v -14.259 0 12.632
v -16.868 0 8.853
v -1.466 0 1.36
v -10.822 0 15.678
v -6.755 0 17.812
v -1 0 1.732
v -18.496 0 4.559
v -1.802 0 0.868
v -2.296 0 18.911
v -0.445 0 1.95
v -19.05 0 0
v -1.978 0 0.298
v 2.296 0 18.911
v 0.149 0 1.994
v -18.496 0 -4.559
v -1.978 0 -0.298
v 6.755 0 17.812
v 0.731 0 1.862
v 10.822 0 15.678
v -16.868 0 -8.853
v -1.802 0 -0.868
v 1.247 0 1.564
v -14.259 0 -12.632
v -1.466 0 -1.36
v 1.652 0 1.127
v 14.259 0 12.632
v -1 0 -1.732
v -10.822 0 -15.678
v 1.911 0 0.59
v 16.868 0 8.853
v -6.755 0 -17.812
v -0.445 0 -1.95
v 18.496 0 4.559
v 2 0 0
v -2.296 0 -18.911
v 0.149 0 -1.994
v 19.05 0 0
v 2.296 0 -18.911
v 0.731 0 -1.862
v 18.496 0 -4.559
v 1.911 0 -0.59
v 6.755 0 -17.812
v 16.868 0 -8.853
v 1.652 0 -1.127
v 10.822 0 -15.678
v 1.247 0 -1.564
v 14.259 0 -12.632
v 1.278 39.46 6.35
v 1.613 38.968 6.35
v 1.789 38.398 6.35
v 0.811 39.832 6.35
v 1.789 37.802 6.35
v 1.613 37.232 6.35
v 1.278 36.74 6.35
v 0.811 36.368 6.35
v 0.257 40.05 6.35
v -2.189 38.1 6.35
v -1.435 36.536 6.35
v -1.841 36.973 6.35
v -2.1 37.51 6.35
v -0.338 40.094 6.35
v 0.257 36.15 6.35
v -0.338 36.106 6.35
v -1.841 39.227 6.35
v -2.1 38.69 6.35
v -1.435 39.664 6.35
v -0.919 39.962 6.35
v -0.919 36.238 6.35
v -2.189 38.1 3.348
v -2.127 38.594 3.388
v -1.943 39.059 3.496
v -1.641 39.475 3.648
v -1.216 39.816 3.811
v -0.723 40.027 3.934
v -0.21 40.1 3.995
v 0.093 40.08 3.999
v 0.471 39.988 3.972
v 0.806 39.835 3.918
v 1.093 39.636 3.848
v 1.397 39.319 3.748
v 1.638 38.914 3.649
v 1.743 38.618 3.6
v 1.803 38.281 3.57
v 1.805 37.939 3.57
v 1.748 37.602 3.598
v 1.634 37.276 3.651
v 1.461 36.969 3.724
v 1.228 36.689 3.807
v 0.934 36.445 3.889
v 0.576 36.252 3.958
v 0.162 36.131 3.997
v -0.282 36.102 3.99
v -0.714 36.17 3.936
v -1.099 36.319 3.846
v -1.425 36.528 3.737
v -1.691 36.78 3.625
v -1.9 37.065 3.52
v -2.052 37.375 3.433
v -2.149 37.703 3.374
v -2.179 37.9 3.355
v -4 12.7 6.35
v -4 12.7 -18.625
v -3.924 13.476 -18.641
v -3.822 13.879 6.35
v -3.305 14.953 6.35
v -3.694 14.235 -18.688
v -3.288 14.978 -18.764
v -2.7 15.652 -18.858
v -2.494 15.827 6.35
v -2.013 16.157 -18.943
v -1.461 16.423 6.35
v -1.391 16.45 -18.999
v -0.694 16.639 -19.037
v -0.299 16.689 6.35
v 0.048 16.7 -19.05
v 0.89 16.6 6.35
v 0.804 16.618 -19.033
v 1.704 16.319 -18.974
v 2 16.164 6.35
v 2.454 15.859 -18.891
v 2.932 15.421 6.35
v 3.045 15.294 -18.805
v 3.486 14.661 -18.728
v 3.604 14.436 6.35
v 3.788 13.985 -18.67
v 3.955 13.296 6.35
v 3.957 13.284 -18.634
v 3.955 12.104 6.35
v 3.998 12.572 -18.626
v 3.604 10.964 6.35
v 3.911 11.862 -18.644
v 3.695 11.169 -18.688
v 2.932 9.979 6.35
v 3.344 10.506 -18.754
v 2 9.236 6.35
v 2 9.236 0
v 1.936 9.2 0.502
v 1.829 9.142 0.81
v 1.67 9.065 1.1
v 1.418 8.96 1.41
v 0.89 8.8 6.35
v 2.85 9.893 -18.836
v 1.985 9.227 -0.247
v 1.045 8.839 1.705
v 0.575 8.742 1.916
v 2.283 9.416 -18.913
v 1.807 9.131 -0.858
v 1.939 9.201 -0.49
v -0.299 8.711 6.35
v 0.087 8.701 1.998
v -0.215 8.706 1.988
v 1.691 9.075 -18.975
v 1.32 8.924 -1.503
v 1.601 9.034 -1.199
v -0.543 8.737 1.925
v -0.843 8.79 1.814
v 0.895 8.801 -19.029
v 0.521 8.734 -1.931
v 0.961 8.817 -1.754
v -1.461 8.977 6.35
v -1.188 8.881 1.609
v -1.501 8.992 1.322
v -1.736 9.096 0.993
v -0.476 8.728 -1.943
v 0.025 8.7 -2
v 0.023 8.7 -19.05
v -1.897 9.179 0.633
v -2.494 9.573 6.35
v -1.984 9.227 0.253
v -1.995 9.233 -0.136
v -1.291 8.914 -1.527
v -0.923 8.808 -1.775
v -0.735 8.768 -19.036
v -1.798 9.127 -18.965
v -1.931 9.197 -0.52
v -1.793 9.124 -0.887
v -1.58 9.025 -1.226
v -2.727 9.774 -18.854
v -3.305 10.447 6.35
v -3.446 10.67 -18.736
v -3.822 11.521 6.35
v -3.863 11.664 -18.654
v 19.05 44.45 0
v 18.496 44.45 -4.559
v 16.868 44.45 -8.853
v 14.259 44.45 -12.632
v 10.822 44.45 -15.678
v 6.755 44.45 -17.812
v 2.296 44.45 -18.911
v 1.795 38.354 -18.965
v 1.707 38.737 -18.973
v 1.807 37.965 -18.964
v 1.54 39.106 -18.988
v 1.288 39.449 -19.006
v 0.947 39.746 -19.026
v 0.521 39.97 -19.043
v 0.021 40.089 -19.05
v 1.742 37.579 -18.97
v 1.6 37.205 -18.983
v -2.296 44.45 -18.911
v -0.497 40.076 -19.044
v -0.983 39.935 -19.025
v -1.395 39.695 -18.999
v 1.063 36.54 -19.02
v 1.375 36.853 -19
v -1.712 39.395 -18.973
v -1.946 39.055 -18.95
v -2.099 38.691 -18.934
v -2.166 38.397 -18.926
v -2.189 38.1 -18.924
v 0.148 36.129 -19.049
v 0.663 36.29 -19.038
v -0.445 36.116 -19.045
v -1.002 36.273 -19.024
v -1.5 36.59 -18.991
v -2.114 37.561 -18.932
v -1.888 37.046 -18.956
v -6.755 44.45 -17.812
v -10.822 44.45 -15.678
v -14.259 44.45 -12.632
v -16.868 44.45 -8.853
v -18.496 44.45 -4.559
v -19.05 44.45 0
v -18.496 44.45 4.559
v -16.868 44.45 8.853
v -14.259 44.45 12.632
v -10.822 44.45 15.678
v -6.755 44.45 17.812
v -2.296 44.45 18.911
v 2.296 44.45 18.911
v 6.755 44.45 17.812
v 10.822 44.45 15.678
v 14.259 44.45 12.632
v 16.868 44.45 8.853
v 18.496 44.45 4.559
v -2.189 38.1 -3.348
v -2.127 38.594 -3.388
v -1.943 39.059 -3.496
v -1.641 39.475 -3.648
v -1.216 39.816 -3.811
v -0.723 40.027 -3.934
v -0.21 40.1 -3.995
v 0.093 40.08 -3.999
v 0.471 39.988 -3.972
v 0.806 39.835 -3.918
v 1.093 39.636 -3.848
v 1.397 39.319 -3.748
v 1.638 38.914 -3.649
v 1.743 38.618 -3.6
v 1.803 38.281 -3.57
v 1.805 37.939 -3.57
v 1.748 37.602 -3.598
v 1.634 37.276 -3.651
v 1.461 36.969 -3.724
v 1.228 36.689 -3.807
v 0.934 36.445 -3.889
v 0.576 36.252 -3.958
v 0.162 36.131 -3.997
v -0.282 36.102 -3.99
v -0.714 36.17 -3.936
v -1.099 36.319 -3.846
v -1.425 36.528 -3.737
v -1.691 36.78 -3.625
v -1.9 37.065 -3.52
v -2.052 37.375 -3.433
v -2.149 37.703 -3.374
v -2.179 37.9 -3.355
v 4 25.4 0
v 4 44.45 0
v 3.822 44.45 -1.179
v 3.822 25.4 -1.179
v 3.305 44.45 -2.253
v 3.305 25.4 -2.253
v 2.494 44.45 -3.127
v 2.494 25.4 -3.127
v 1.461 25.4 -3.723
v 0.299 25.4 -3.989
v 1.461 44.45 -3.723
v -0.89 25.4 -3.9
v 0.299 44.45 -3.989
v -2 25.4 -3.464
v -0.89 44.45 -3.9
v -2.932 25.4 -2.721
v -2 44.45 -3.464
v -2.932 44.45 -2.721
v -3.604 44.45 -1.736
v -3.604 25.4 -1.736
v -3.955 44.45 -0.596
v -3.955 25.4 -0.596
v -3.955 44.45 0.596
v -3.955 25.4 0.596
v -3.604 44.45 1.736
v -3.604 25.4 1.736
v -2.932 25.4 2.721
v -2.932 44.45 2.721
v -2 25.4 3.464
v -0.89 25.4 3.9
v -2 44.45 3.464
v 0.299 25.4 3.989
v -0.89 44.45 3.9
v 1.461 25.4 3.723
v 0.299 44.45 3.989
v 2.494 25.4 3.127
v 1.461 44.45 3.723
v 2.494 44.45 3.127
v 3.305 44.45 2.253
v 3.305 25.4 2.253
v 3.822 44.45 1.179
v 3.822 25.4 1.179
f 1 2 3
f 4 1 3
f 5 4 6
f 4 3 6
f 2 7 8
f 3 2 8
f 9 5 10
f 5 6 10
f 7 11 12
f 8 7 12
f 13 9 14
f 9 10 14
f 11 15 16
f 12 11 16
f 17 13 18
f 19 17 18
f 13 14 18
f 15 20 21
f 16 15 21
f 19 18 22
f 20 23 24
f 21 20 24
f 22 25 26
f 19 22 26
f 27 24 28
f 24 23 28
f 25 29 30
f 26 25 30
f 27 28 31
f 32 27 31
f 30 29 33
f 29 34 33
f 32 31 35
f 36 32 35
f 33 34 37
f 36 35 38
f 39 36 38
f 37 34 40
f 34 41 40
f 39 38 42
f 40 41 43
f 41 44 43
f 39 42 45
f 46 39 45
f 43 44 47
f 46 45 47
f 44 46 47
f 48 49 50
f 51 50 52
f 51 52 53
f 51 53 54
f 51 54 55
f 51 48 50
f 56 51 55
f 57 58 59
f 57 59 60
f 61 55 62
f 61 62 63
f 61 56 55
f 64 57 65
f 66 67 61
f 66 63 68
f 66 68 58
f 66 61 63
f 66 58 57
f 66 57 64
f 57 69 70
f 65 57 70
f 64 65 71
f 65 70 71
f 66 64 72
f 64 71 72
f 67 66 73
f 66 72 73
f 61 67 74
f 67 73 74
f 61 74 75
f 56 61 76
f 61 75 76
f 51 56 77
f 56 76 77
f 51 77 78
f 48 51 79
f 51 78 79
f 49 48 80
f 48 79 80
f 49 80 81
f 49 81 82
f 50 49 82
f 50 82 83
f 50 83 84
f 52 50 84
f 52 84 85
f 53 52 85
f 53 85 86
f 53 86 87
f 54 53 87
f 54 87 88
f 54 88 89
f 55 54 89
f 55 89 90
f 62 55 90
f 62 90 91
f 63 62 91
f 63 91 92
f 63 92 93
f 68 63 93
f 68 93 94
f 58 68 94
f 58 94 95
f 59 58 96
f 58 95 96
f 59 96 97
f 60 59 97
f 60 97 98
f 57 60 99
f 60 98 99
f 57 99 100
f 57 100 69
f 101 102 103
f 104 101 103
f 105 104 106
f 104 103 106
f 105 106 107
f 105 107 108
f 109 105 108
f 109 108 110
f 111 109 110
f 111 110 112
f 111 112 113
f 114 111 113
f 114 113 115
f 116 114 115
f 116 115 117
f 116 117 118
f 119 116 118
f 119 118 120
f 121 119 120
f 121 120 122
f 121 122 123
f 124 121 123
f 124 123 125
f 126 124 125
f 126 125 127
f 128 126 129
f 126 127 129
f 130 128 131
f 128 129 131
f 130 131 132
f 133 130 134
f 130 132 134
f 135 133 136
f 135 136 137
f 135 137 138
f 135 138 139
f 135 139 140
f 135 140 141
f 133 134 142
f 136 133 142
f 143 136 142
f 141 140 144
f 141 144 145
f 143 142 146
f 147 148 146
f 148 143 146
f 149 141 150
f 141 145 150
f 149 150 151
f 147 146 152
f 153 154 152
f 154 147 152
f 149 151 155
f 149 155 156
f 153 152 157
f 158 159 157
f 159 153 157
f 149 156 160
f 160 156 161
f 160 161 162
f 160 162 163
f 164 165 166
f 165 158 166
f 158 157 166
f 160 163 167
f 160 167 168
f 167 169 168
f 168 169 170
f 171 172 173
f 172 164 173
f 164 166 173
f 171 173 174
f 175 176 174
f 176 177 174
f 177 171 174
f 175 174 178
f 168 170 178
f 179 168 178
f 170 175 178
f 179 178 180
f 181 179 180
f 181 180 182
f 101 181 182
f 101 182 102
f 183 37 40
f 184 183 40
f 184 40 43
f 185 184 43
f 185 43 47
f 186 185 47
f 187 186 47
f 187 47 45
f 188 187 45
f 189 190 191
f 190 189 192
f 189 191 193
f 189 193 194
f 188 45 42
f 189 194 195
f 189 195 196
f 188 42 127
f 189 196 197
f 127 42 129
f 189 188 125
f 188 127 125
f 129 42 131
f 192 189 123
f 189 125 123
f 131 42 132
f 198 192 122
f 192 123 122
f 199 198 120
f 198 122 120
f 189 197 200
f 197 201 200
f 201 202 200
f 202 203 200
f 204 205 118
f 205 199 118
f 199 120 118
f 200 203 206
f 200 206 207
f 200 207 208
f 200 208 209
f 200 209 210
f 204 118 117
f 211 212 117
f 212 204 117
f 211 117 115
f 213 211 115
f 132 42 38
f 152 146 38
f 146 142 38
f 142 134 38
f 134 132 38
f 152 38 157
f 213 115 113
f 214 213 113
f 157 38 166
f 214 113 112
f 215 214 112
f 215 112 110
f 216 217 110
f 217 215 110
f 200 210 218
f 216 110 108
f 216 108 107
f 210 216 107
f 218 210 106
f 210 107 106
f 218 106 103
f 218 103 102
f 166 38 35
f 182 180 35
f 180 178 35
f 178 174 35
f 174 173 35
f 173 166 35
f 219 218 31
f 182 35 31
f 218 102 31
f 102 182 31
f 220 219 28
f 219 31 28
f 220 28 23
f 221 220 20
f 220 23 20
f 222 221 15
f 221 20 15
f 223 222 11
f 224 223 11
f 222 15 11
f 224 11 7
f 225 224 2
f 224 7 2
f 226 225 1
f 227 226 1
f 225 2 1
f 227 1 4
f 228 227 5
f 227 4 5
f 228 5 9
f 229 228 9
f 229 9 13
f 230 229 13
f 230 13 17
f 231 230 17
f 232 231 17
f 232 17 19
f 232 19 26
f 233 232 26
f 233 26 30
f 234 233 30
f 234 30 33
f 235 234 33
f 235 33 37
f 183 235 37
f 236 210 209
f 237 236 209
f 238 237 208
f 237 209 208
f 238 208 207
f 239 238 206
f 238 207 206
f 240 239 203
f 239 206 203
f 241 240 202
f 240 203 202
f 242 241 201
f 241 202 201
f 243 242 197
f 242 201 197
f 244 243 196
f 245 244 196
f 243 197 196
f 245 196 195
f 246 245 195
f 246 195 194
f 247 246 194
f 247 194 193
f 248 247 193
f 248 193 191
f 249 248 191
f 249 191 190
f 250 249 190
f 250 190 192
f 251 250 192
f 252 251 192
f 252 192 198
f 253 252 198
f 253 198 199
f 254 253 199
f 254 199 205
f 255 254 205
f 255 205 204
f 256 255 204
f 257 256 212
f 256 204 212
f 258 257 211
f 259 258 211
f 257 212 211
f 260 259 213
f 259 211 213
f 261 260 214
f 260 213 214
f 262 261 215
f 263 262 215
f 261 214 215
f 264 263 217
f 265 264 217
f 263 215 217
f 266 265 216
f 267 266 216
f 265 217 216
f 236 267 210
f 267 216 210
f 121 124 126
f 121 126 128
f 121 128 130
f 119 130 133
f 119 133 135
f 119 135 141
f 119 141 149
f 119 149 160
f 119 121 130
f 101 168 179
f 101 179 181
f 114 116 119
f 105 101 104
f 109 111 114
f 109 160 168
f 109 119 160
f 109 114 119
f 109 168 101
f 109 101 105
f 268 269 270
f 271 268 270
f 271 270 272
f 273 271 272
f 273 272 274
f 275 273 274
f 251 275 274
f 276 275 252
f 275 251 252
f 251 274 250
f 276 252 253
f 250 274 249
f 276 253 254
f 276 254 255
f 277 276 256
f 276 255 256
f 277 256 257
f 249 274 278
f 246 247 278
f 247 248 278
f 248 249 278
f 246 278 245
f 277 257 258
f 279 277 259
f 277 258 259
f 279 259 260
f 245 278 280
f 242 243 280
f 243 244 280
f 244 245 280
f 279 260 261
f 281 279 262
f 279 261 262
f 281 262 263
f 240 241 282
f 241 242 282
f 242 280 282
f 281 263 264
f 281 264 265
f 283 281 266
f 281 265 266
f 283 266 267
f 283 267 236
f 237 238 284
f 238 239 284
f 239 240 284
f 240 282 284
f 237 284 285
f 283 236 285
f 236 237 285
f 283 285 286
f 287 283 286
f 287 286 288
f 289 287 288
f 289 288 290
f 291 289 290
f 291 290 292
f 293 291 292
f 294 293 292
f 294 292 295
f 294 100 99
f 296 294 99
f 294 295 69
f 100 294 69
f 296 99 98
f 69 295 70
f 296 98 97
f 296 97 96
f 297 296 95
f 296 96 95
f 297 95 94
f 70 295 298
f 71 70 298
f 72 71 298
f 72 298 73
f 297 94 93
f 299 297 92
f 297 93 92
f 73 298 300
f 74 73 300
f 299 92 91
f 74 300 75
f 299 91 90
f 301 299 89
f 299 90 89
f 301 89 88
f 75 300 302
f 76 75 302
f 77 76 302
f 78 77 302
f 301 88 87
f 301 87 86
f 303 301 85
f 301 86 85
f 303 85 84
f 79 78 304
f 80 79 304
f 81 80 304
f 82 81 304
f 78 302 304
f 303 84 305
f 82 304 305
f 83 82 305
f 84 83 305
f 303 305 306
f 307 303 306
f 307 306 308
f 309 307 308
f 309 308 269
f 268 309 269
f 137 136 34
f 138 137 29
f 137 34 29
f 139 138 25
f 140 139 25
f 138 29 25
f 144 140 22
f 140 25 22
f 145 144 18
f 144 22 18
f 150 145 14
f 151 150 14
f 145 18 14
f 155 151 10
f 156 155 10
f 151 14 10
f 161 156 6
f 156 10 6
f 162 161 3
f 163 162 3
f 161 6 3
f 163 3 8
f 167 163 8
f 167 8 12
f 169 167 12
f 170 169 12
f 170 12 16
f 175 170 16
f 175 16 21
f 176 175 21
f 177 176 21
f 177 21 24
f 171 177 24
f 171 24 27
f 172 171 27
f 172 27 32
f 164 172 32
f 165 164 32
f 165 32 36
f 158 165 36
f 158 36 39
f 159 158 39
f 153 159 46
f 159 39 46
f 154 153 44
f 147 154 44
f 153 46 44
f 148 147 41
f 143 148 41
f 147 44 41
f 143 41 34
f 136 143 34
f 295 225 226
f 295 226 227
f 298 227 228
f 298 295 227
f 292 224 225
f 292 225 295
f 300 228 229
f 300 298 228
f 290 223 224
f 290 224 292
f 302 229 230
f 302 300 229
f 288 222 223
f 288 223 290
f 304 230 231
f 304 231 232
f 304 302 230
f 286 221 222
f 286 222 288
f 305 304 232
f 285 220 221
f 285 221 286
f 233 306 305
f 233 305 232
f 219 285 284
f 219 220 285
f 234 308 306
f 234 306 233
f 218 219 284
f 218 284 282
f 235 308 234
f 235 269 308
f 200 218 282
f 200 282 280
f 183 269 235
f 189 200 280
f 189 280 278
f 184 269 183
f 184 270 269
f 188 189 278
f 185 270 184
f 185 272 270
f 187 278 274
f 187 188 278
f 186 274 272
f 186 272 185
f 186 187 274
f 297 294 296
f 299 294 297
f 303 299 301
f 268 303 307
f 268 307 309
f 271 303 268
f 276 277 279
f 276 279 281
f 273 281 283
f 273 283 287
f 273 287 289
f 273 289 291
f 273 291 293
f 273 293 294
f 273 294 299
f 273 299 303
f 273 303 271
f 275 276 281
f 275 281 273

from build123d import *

# Parameters (mm, degrees)
SKETCH1_R           = 19.05
BOSS_EXTRUDE1_DEPTH = 50.8
SKETCH2_R           = 4.0000047
CUT_EXTRUDE1_DEPTH  = 25.4
SKETCH4_R           = 4
SKETCH4_R_2         = 2
CUT_EXTRUDE2_DEPTH  = 25.4
SKETCH6_R           = 2
CUT_EXTRUDE3_DEPTH  = 12.7
SKETCH7_R           = 19.05
CUT_EXTRUDE4_DEPTH  = 6.35


with BuildPart() as part:
    # Sketch1 → Boss-Extrude1 (new body)
    with BuildSketch(Plane(origin=(0, 0, 0), x_dir=(1, 0, 0), z_dir=(0, 1, 0))):
        Circle(SKETCH1_R)
    extrude(amount=BOSS_EXTRUDE1_DEPTH)

    # Sketch2 → Cut-Extrude1 (cut)
    with BuildSketch(Plane(origin=(0, 50.8, 0), x_dir=(1, 0, 0), z_dir=(0, 1, 0))):
        Circle(SKETCH2_R)
    extrude(amount=-CUT_EXTRUDE1_DEPTH, mode=Mode.SUBTRACT)

    # Sketch4 → Cut-Extrude2 (cut)
    with BuildSketch(Plane(origin=(0, 0, -19.05), x_dir=(-1, 0, 0), z_dir=(0, 0, -1))):
        with Locations((0, 12.7)):
            Circle(SKETCH4_R)
        with Locations((0.188503161, 38.1)):
            Circle(SKETCH4_R_2)
    extrude(amount=-CUT_EXTRUDE2_DEPTH, mode=Mode.SUBTRACT)

    # Sketch6 → Cut-Extrude3 (cut)
    with BuildSketch(Plane.XZ):
        Circle(SKETCH6_R)
    extrude(amount=-CUT_EXTRUDE3_DEPTH, mode=Mode.SUBTRACT)

    # Sketch7 → Cut-Extrude4 (cut)
    with BuildSketch(Plane(origin=(0, 50.8, 0), x_dir=(1, 0, 0), z_dir=(0, 1, 0))):
        Circle(SKETCH7_R)
    extrude(amount=-CUT_EXTRUDE4_DEPTH, mode=Mode.SUBTRACT)


solid = part.part
